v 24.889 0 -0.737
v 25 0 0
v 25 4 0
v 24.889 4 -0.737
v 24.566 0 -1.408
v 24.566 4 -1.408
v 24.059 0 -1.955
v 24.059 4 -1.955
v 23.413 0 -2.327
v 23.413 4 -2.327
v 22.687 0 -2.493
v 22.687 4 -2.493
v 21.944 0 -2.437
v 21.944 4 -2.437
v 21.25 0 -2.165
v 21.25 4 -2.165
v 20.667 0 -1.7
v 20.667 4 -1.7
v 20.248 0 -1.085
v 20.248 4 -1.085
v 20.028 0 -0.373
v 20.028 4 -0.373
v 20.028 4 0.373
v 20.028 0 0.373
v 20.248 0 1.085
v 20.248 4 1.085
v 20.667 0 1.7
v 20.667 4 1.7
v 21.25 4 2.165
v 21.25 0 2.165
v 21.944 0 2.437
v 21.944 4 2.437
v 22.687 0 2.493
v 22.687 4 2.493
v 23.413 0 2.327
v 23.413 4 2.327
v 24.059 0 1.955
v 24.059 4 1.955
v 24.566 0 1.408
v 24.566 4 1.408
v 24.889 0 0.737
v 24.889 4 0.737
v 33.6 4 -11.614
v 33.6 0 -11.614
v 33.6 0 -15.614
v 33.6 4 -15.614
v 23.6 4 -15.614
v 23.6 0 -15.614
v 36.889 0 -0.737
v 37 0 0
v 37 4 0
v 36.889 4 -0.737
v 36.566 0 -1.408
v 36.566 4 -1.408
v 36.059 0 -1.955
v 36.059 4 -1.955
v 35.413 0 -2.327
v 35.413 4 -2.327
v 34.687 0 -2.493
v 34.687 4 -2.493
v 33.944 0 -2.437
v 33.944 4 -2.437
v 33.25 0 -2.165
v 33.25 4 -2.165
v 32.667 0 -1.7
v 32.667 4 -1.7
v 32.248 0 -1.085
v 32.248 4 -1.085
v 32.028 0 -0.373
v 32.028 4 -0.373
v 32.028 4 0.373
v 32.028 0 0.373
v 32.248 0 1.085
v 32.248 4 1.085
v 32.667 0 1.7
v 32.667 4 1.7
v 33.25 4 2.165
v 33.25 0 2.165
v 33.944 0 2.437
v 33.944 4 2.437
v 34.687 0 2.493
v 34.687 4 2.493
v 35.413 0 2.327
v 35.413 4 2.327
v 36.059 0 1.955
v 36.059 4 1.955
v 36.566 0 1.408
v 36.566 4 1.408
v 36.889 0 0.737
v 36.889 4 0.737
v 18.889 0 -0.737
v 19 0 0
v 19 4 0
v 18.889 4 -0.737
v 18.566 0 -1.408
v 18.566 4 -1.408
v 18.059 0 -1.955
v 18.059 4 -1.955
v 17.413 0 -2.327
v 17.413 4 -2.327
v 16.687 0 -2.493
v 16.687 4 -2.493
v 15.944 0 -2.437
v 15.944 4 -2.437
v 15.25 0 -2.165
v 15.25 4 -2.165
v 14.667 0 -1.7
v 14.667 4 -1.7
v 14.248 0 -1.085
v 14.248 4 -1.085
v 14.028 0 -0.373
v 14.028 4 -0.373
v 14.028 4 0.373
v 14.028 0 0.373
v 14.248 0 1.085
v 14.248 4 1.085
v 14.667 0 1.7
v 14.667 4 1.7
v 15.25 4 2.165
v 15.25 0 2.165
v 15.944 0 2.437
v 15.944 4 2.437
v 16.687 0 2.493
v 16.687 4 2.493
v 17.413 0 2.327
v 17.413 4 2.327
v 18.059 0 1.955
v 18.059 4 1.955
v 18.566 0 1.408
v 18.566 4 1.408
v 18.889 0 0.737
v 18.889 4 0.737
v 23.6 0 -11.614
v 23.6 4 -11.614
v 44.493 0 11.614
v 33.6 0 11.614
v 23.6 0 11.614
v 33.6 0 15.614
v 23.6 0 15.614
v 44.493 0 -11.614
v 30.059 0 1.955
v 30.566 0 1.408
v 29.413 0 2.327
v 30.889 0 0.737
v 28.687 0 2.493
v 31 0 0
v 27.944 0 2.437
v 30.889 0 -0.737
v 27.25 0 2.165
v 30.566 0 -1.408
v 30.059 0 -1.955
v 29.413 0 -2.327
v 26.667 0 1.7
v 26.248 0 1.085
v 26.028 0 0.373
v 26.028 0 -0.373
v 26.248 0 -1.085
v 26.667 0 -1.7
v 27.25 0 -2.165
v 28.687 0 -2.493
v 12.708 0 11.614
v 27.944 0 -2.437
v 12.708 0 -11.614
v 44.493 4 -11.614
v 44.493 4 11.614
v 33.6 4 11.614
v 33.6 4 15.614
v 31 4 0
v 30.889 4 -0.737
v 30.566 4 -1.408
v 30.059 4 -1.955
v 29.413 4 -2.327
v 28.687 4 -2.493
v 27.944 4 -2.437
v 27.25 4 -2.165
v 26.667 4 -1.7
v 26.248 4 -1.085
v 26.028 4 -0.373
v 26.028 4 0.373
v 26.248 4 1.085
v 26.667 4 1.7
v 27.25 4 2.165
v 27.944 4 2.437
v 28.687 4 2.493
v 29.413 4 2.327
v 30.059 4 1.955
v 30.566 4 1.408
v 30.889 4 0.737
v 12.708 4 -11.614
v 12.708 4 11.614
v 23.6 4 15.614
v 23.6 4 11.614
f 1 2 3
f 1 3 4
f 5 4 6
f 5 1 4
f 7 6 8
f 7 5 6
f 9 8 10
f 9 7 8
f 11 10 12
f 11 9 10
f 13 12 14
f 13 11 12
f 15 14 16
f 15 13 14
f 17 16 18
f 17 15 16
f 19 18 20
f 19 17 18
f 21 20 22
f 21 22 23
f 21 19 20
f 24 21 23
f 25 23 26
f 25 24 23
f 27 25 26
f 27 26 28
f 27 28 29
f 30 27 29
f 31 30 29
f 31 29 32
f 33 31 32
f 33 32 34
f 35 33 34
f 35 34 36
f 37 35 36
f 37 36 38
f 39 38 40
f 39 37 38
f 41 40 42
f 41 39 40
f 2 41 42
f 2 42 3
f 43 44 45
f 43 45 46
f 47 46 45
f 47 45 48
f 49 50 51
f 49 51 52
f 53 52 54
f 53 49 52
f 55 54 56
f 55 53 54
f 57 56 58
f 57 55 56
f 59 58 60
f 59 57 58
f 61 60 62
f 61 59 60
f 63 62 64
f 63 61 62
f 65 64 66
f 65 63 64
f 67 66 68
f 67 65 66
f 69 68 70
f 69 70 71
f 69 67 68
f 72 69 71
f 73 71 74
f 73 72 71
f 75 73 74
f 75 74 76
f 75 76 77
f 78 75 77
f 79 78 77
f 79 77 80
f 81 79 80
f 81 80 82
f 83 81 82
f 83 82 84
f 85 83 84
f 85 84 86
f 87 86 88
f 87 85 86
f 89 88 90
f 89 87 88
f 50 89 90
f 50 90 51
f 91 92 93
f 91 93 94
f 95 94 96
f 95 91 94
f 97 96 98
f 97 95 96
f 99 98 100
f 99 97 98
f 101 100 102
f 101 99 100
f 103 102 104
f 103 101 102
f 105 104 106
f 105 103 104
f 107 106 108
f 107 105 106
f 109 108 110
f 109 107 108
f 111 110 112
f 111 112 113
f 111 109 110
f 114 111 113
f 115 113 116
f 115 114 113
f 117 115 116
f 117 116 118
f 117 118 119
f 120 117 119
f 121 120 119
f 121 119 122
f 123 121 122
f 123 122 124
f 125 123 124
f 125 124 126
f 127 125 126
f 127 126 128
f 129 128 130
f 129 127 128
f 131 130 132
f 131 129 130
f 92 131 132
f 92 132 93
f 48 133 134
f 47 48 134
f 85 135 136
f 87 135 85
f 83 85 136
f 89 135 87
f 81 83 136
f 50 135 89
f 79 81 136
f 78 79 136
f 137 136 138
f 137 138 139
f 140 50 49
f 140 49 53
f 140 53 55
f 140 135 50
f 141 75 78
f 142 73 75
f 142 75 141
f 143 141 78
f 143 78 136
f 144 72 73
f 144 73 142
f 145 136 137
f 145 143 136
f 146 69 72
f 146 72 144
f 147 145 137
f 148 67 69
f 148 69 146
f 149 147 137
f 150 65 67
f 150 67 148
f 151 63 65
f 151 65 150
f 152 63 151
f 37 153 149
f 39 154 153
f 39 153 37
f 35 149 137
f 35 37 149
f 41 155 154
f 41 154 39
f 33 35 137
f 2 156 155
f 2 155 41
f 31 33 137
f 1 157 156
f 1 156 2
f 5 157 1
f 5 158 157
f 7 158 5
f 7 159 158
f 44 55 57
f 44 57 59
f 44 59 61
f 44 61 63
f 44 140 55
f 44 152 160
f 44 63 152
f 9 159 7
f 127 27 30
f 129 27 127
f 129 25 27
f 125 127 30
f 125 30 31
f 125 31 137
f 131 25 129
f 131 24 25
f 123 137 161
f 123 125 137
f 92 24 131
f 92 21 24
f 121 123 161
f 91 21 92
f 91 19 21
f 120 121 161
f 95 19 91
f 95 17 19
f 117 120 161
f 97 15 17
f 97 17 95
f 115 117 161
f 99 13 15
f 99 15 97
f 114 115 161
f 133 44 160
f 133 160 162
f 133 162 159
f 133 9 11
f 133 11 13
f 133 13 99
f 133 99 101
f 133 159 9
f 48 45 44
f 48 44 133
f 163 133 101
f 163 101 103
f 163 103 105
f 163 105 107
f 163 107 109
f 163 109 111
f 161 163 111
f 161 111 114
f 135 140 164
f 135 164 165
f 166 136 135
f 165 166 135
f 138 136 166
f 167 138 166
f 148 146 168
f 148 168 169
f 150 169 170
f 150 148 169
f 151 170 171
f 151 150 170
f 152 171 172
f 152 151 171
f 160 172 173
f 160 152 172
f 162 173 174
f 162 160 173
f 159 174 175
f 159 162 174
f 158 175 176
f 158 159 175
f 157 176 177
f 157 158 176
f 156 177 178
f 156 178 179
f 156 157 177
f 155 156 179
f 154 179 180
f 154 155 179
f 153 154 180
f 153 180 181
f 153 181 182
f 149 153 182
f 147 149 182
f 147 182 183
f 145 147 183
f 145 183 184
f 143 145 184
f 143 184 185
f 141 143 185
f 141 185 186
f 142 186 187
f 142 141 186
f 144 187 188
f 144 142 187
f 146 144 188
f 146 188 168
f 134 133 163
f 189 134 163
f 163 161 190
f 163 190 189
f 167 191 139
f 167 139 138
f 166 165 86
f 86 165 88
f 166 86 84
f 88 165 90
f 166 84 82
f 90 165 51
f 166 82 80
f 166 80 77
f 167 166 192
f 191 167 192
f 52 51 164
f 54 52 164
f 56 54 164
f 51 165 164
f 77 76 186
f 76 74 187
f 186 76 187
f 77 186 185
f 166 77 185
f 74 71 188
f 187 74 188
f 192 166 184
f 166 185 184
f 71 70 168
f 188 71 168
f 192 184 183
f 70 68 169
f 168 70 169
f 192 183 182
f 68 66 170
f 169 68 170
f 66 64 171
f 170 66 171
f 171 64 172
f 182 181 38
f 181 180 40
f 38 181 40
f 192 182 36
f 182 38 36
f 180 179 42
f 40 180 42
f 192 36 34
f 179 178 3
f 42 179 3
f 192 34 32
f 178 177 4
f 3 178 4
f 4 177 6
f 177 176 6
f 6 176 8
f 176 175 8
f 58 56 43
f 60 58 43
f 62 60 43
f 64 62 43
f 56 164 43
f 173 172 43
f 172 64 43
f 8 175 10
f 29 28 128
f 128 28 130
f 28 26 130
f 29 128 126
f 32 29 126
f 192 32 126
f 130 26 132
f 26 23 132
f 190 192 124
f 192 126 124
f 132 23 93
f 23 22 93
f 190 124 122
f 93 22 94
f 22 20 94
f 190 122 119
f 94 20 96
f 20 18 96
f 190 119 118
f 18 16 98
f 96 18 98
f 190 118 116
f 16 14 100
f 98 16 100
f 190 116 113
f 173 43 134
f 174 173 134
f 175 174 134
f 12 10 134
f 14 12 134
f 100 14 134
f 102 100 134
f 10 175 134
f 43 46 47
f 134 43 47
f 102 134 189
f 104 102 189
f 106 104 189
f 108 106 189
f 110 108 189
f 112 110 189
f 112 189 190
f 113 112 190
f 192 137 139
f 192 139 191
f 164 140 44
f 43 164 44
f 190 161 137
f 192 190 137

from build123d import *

# Parameters (mm, degrees)
SKETCH1_R           = 2.5
BOSS_EXTRUDE2_DEPTH = 4
SKETCH14_W          = 10
SKETCH14_H          = 4
BOSS_EXTRUDE5_DEPTH = 4
SKETCH15_W          = 10
SKETCH15_H          = 4
BOSS_EXTRUDE6_DEPTH = 4


with BuildPart() as part:
    # Sketch1 → Boss-Extrude2 (new body)
    with BuildSketch(Plane(origin=(0, 0, 0), x_dir=(1, 0, 0), z_dir=(0, 1, 0))):
        Polygon((36.786877756, 11.613831083), (44.492502068, 11.613831083), (44.492502068, -11.613831083), (36.786877756, -11.613831083), (27.518556454, -11.613831083), (12.70818574, -11.613831083), (12.70818574, 11.613831083), (27.518556454, 11.613831083), align=None)
        with Locations((16.5, 0)):
            Circle(SKETCH1_R, mode=Mode.SUBTRACT)
        with Locations((22.5, 0)):
            Circle(SKETCH1_R, mode=Mode.SUBTRACT)
        with Locations((28.5, 0)):
            Circle(SKETCH1_R, mode=Mode.SUBTRACT)
        with Locations((34.5, 0)):
            Circle(SKETCH1_R, mode=Mode.SUBTRACT)
    extrude(amount=BOSS_EXTRUDE2_DEPTH)

    # Sketch14 → Boss-Extrude5 (add)
    with BuildSketch(Plane.XY.offset(11.613831083)):
        with Locations((28.600343904, 2)):
            Rectangle(SKETCH14_W, SKETCH14_H)
    extrude(amount=BOSS_EXTRUDE5_DEPTH)

    # Sketch15 → Boss-Extrude6 (add)
    with BuildSketch(Plane(origin=(0, 0, -11.613831083), x_dir=(-1, 0, 0), z_dir=(0, 0, -1))):
        with Locations((-28.600343904, 2)):
            Rectangle(SKETCH15_W, SKETCH15_H)
    extrude(amount=BOSS_EXTRUDE6_DEPTH)


solid = part.part
